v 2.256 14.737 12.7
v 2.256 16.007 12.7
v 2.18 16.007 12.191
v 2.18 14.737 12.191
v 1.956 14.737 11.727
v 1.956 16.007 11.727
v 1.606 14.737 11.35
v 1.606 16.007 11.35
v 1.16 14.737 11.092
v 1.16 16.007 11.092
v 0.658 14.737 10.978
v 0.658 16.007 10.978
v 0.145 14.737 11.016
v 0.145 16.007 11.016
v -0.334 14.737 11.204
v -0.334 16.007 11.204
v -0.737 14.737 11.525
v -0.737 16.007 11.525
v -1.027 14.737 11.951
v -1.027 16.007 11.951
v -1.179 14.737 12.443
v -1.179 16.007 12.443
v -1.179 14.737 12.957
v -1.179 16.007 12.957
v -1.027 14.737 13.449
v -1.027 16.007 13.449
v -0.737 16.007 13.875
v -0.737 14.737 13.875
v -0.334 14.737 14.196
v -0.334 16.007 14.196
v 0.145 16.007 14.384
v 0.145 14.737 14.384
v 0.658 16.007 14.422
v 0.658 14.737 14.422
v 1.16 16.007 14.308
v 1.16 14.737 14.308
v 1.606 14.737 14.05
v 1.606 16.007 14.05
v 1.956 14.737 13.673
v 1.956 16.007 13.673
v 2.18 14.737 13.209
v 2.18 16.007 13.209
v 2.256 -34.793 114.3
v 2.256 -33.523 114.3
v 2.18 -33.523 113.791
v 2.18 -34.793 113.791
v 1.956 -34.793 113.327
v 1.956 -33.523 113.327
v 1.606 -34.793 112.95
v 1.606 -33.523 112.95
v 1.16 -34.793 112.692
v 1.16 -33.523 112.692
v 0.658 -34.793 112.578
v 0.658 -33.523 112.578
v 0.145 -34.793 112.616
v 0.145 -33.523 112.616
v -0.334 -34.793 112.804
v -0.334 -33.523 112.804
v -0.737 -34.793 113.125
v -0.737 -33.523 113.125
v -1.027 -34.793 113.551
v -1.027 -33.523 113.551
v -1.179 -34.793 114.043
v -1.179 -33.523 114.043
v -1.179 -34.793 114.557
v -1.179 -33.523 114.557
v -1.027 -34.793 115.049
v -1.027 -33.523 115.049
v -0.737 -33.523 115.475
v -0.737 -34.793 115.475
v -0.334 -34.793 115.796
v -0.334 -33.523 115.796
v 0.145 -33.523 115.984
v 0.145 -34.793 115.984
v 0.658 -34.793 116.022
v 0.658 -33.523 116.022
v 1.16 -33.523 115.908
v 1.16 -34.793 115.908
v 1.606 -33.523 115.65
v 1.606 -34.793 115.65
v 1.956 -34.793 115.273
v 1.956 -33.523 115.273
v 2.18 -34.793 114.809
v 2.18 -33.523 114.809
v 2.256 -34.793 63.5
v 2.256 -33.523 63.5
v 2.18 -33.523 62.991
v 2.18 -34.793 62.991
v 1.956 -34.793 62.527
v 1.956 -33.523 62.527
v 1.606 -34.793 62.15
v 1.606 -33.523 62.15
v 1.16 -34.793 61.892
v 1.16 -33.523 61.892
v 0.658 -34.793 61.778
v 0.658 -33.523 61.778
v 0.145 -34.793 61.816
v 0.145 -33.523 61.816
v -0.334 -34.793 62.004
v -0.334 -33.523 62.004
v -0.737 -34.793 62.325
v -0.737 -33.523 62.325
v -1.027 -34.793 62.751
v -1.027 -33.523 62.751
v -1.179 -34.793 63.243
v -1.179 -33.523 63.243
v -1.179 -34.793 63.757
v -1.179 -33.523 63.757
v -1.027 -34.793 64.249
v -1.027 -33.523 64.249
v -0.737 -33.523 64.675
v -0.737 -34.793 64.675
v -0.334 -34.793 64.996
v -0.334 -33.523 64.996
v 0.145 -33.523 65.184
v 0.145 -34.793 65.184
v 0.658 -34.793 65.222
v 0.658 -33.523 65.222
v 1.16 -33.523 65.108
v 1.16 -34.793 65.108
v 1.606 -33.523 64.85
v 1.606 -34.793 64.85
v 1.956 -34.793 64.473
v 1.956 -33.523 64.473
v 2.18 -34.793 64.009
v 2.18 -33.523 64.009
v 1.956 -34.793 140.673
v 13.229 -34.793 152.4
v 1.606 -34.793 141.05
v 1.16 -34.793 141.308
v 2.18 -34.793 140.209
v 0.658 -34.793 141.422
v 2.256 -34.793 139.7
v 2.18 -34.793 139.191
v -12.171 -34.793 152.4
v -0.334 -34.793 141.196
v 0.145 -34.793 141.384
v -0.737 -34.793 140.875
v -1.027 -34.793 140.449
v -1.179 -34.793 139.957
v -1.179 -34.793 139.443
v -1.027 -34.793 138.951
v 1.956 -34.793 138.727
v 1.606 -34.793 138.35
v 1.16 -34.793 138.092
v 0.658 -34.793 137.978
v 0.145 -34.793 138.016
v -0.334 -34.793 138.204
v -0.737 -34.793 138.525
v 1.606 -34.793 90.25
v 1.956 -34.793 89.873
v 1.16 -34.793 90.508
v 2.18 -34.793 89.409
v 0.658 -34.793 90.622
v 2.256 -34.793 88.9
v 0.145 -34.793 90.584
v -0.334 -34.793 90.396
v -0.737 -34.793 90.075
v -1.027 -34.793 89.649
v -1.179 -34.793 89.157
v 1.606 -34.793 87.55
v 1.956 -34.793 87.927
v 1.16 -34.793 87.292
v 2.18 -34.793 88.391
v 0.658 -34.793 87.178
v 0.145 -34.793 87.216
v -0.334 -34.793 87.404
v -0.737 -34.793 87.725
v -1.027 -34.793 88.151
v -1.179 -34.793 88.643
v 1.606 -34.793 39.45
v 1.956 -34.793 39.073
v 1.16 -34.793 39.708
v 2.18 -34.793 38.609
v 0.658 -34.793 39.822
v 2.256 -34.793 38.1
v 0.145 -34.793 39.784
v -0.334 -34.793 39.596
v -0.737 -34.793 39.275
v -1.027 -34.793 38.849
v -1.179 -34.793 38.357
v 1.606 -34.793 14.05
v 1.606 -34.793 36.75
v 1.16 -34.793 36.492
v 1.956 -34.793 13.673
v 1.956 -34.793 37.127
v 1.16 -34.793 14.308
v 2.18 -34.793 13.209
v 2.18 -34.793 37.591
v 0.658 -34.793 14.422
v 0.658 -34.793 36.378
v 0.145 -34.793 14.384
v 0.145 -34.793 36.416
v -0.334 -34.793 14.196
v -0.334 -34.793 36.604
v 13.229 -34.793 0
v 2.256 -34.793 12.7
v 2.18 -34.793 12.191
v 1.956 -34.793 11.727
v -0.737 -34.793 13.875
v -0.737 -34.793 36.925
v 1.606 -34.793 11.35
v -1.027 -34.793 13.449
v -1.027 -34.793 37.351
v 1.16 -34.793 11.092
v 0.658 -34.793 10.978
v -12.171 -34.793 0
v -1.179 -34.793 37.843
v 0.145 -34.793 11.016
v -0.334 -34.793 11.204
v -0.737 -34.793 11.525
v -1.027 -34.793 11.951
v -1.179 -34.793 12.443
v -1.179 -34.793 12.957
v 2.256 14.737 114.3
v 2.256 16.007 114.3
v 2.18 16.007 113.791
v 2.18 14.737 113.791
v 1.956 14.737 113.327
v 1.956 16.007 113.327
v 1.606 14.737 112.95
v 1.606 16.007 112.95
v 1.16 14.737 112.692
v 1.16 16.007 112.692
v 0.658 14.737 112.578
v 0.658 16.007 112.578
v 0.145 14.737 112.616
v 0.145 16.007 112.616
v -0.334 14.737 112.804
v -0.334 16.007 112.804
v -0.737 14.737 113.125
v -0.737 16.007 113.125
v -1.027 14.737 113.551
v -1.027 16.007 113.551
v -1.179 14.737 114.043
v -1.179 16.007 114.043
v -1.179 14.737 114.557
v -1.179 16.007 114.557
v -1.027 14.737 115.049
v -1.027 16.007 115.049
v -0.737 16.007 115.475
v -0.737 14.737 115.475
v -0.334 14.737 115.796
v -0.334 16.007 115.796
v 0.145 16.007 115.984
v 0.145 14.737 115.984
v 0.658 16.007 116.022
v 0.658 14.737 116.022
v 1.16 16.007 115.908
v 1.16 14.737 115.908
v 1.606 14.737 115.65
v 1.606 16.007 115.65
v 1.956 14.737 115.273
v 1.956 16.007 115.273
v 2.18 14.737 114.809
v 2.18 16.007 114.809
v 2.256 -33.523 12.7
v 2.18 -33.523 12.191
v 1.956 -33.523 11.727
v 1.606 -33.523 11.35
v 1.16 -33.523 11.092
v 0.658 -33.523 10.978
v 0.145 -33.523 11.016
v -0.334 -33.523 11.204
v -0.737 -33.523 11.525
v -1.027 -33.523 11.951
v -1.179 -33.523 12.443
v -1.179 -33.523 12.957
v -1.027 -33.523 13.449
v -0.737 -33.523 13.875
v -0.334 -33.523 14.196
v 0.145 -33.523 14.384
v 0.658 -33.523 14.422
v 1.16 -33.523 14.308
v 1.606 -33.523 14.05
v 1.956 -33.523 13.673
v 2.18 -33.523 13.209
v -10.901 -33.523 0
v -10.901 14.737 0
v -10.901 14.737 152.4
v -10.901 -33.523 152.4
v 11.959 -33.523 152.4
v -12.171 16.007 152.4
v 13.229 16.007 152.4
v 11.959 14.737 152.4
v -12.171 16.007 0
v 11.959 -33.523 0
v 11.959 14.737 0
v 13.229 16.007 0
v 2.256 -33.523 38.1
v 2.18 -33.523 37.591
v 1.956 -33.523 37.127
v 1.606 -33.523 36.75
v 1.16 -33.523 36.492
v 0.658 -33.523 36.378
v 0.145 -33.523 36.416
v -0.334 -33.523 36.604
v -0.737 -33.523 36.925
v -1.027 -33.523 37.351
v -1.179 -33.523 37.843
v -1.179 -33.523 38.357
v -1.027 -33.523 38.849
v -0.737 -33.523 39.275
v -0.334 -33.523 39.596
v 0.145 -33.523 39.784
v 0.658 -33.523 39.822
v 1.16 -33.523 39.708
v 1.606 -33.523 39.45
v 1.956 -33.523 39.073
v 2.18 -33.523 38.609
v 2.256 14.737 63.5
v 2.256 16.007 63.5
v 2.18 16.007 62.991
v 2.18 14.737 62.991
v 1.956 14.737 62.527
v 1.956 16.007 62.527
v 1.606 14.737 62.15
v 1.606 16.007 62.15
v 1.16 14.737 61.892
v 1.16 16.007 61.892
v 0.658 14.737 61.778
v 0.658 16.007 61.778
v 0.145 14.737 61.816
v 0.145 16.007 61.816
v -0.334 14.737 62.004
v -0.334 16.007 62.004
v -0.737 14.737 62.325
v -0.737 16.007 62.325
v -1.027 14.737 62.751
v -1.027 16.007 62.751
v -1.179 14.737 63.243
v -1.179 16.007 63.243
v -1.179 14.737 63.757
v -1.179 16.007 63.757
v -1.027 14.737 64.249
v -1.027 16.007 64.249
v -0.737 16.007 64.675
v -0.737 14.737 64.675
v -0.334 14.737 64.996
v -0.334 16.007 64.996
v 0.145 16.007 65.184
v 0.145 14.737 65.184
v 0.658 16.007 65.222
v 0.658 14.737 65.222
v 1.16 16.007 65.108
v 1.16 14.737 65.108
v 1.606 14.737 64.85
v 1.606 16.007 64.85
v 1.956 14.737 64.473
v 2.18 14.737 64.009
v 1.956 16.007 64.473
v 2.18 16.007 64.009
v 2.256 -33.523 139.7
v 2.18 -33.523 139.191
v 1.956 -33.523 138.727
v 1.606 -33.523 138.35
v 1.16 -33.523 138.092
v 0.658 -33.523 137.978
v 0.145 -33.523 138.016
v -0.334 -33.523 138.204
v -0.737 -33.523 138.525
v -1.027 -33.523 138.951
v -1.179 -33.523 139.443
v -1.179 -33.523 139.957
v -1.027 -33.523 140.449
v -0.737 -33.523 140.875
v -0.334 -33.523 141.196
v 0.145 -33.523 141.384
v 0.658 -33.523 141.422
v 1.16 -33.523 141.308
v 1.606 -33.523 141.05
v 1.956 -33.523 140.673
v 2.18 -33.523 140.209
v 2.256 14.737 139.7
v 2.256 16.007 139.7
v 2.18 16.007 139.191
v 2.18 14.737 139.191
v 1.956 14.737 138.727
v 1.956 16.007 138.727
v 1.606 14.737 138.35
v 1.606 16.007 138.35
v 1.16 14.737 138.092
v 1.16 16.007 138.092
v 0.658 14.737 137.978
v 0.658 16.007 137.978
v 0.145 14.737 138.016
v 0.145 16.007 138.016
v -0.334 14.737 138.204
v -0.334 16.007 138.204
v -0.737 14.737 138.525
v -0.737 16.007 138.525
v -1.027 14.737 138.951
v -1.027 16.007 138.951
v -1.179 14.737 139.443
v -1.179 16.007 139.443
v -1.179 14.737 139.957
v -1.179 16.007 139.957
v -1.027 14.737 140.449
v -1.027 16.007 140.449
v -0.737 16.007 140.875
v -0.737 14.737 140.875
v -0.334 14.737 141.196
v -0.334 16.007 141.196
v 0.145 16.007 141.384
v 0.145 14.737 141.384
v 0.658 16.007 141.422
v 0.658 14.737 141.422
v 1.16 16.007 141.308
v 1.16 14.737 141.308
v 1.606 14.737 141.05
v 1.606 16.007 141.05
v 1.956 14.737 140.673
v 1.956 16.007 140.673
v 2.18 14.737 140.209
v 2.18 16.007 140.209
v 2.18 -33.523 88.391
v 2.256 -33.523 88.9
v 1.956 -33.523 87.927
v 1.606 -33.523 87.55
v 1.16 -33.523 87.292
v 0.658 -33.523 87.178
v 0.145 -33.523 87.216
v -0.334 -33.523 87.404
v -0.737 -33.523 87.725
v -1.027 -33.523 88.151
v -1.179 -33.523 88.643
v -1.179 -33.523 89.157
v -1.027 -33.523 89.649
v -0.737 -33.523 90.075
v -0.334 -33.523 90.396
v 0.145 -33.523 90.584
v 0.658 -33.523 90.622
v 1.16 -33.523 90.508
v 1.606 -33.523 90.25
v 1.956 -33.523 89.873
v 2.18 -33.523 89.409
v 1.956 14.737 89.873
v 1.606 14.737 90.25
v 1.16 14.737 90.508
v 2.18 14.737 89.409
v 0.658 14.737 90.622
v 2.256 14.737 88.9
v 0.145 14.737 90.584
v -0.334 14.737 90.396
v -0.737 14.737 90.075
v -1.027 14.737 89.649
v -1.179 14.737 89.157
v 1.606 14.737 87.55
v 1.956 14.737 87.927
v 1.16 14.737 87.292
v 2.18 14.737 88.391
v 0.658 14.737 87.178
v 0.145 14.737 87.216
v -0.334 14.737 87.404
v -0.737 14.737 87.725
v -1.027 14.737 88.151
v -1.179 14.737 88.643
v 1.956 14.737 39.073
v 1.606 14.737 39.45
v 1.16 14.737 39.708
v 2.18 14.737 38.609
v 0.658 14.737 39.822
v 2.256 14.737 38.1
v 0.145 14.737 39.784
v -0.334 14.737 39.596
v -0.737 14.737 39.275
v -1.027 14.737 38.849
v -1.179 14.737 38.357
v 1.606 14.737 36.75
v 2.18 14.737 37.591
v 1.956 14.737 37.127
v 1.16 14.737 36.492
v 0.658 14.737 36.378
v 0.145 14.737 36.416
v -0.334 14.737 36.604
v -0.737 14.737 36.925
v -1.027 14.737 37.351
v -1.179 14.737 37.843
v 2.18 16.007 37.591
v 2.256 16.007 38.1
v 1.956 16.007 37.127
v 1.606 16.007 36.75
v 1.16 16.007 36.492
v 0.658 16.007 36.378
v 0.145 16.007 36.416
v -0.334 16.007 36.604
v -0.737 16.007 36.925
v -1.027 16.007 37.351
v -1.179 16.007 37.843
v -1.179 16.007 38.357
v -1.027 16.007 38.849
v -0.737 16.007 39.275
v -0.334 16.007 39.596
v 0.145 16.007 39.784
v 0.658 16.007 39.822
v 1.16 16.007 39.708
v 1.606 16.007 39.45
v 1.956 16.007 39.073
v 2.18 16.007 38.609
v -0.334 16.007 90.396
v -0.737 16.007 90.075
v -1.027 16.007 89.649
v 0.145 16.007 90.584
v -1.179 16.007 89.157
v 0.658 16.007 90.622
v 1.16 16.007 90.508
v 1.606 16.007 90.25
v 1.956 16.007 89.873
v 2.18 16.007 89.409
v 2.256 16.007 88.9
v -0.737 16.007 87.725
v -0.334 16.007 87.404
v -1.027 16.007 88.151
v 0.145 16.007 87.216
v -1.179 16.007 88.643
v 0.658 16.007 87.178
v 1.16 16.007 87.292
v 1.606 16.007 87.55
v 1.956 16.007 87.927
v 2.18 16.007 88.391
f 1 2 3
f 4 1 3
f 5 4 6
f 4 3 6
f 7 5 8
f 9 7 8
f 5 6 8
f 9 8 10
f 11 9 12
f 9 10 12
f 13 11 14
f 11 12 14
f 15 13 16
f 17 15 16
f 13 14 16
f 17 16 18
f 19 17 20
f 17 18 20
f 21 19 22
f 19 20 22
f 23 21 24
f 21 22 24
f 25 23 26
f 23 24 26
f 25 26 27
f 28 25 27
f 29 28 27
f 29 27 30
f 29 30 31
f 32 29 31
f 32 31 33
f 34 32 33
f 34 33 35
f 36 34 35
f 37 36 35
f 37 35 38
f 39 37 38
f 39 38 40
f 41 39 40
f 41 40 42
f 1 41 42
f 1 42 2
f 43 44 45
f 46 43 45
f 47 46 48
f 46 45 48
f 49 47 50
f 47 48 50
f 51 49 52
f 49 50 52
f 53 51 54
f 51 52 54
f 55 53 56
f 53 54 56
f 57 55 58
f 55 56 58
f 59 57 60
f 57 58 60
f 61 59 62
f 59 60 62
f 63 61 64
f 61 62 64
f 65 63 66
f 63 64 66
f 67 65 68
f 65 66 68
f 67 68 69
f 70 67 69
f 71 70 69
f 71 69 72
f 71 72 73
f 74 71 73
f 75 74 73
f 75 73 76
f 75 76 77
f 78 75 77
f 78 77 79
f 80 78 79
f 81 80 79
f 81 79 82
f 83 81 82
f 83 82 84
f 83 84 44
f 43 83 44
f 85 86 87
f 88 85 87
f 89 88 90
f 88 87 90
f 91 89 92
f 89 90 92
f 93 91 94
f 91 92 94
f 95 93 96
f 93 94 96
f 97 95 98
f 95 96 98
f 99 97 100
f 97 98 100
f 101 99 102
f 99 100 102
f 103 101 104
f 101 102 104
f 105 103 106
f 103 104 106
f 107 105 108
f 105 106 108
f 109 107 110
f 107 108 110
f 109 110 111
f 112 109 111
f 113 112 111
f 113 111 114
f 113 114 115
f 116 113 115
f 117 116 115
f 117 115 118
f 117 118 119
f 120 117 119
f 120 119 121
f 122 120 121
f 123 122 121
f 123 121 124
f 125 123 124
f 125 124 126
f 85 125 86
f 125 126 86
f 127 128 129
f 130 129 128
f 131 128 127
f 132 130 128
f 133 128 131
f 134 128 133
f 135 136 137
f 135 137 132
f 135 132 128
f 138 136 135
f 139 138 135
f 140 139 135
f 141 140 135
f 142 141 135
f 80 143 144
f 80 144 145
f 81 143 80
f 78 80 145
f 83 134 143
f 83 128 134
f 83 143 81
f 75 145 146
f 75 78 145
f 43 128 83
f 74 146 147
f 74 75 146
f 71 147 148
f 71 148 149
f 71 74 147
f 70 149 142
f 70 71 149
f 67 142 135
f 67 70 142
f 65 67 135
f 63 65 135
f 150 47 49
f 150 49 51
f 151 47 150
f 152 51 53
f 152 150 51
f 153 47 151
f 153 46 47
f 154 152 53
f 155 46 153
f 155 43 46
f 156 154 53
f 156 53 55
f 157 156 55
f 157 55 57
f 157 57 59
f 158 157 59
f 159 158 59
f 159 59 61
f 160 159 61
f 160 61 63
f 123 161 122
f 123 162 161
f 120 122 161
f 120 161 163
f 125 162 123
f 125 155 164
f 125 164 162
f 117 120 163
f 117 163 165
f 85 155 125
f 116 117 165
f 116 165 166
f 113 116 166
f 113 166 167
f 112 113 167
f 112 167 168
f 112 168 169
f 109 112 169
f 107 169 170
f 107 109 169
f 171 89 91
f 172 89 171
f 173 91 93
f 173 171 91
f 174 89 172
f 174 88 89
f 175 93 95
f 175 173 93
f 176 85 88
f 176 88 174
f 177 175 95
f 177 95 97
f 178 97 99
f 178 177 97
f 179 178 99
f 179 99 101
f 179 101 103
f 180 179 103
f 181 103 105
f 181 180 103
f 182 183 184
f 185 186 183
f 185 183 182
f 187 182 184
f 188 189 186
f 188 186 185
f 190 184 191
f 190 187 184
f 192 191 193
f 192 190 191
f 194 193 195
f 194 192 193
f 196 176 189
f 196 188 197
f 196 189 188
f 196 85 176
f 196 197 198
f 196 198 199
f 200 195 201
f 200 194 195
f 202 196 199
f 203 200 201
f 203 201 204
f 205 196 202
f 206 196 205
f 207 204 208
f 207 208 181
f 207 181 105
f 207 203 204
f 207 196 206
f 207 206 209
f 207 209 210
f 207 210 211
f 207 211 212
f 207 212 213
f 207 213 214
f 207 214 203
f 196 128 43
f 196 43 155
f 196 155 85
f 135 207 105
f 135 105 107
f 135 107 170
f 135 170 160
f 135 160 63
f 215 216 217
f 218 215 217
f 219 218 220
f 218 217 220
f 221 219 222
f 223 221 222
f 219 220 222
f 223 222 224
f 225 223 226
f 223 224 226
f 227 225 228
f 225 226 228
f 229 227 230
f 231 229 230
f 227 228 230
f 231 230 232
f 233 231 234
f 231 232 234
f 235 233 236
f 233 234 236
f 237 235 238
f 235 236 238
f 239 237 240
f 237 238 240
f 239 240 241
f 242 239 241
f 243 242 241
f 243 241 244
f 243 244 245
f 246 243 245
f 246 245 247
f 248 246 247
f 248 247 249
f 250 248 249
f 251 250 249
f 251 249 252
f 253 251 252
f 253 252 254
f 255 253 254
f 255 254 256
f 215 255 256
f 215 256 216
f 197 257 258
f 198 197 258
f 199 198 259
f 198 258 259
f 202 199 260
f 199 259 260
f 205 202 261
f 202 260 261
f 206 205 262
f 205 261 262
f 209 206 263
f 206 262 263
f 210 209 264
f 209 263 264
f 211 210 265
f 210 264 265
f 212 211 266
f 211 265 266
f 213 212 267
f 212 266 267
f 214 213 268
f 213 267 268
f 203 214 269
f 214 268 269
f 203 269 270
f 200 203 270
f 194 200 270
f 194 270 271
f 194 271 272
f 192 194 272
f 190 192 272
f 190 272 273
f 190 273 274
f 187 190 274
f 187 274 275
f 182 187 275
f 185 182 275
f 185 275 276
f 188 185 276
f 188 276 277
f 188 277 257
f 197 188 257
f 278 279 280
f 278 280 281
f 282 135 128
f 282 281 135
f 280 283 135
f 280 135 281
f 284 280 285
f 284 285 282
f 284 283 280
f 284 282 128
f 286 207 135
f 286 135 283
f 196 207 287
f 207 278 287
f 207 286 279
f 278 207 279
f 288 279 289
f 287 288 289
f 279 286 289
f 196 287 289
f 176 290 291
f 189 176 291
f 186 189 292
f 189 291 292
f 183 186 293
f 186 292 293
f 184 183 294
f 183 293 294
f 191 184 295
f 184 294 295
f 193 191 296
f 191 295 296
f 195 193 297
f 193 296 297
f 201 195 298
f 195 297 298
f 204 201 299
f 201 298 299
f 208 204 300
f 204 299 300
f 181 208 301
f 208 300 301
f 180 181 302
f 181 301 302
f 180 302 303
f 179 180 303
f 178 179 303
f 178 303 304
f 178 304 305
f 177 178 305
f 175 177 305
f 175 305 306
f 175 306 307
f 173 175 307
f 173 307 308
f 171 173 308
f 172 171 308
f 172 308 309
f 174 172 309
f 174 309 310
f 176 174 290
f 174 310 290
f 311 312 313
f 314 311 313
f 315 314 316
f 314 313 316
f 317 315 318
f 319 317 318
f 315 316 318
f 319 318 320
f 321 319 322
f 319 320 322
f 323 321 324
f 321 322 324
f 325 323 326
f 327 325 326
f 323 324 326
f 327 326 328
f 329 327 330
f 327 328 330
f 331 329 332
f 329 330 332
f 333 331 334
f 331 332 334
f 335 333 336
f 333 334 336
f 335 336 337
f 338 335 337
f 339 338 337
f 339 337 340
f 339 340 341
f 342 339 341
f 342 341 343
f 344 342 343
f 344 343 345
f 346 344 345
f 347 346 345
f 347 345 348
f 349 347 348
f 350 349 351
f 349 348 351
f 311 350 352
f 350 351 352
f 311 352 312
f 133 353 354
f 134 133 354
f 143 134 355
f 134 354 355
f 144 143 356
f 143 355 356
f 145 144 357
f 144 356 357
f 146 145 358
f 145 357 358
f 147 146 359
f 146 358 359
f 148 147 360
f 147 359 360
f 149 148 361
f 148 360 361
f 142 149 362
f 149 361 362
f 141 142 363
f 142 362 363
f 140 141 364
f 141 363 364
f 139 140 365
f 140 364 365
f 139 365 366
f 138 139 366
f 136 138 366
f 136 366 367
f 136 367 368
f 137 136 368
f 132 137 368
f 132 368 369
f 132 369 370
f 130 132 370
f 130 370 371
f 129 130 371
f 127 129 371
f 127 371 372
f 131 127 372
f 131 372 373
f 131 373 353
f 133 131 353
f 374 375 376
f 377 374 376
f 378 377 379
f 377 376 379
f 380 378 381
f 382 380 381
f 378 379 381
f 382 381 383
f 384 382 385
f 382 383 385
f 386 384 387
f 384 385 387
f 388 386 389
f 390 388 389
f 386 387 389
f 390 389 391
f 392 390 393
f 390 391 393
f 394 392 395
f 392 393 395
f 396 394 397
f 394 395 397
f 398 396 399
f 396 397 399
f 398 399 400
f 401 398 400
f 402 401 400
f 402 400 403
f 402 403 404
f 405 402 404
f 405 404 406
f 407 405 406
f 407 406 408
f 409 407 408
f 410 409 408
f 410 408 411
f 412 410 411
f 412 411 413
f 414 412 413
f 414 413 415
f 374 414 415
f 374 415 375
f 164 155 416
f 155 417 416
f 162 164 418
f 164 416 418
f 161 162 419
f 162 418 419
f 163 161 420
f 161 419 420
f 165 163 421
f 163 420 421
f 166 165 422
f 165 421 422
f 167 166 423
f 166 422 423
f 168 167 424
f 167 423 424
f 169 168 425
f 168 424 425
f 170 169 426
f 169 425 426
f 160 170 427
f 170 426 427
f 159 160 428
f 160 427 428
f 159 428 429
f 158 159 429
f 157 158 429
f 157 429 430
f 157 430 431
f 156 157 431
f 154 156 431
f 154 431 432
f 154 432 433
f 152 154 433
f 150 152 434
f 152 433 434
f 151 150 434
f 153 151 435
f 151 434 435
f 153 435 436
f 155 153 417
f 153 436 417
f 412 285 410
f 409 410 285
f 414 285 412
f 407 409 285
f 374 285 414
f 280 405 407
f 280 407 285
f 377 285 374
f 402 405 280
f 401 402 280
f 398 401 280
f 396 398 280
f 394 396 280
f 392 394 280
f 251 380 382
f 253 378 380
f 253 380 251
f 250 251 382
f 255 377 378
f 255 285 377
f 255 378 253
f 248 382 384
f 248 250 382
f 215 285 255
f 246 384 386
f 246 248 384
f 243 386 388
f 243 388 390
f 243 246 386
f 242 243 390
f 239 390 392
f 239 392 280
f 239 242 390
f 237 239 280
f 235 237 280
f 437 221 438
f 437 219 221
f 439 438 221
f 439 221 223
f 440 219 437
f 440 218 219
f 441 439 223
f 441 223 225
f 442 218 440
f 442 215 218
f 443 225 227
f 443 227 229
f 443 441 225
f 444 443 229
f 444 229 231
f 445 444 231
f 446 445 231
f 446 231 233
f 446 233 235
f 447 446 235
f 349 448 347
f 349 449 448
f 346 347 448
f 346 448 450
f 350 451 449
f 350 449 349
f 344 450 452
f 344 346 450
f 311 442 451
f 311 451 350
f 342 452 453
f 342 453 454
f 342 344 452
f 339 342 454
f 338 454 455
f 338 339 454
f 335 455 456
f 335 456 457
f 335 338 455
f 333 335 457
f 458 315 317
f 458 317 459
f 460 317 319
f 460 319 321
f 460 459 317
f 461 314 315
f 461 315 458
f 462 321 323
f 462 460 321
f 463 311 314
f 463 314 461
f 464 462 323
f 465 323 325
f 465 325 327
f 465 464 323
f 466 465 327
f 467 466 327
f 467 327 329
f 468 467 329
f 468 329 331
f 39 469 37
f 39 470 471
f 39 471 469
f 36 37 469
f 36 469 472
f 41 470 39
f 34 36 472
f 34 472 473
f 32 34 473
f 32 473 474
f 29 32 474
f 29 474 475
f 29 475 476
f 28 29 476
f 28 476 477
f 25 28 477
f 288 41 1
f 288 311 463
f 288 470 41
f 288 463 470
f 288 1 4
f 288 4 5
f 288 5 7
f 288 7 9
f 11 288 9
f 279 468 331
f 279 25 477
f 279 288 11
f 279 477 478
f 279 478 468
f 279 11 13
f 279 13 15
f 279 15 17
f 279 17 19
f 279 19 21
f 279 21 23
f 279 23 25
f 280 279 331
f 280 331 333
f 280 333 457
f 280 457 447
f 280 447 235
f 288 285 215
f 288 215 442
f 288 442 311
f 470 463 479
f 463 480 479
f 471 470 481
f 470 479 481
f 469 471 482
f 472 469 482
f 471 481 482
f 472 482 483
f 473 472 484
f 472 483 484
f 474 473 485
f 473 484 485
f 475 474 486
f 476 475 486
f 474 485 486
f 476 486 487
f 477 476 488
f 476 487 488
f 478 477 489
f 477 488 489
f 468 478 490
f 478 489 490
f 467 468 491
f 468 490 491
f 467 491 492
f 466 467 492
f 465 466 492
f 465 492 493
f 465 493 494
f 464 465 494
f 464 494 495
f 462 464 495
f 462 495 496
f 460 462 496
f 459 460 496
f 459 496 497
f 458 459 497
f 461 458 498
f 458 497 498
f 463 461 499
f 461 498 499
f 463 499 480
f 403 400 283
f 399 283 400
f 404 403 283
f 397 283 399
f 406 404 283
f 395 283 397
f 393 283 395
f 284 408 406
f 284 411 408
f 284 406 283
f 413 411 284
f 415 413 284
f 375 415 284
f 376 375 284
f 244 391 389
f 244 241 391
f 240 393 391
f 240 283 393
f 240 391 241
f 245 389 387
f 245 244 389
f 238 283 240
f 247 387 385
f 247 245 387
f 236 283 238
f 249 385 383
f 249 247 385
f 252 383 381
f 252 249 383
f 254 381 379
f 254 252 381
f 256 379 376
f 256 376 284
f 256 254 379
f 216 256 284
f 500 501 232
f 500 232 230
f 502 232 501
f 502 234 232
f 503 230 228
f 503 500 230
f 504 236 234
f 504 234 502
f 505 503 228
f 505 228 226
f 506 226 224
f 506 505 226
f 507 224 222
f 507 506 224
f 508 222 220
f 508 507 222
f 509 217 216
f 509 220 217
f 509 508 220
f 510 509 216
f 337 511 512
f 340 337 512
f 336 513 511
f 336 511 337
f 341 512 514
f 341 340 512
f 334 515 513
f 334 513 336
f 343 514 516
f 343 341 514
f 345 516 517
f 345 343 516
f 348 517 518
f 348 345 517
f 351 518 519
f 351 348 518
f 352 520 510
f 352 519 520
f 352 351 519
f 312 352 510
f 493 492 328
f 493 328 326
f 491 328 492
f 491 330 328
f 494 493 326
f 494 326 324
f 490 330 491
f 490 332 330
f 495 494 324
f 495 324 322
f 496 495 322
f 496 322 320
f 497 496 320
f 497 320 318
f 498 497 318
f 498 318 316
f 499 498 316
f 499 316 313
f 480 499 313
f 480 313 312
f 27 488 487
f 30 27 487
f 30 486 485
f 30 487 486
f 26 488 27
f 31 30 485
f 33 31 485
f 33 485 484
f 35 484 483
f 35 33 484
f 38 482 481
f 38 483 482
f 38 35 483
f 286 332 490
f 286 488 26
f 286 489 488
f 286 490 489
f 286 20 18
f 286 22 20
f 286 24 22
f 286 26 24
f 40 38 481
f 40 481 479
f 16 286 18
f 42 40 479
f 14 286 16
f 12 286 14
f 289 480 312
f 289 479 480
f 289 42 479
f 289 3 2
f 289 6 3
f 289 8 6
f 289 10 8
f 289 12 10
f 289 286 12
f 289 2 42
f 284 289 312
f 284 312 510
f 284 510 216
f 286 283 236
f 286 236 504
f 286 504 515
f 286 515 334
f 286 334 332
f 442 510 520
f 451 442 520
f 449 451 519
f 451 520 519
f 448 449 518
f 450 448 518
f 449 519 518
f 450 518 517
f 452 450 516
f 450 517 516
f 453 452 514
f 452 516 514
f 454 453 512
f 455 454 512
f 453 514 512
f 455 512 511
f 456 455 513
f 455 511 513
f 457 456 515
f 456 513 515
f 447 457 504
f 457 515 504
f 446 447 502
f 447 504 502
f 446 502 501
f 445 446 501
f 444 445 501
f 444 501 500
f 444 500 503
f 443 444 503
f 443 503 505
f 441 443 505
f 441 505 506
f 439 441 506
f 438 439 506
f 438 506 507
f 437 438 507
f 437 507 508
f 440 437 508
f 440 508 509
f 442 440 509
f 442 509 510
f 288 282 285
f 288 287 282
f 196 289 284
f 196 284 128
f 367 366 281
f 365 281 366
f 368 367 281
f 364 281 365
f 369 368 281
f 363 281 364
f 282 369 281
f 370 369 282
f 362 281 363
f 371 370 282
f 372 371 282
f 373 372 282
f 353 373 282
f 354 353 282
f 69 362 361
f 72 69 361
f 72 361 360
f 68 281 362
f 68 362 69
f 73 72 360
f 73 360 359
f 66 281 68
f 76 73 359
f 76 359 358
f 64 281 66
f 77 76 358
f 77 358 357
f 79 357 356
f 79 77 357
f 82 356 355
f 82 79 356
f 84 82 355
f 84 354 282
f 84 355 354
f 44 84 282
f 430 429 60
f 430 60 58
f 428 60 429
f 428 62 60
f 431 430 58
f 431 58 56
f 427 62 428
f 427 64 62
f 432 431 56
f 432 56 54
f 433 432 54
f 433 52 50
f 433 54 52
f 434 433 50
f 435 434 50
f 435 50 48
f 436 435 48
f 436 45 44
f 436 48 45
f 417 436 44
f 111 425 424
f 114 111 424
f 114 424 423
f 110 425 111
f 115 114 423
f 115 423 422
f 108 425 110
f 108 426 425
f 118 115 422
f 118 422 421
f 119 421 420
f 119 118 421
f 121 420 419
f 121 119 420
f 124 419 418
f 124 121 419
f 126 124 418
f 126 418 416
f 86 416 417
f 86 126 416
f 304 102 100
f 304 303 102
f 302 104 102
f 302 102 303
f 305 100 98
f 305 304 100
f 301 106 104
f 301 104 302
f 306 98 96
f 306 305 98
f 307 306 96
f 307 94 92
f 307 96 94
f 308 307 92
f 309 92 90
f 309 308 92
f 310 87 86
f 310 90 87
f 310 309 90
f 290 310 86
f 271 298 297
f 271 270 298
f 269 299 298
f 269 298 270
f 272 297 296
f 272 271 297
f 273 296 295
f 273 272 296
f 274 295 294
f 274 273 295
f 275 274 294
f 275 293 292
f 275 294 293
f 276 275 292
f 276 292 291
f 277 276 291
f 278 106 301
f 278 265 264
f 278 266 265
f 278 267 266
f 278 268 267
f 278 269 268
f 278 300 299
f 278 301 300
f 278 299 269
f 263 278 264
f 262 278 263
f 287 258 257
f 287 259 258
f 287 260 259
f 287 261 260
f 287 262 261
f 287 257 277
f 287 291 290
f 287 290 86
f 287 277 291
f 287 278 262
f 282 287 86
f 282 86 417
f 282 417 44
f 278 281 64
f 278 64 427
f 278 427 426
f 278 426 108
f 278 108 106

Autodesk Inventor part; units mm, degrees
ref_plane "YZ Plane" through (0, 0, 0) normal (1, 0, 0) x (0, 1, 0)
ref_plane "XZ Plane" through (0, 0, 0) normal (0, 1, 0) x (-1, 0, 0)
ref_plane "XY Plane" through (0, 0, 0) normal (0, 0, 1) x (1, 0, 0)
sketch "Sketch1" plane through (0, 0, 0) normal (0, 0, 1) x (1, 0, 0)
  line L0 (-12.1708, 16.0073) -> (13.2292, 16.0073)
  line L1 (13.2292, 16.0073) -> (13.2292, -34.7927)
  line L2 (13.2292, -34.7927) -> (-12.1708, -34.7927)
  line L3 (-12.1708, -34.7927) -> (-12.1708, 16.0073)
  line L4 (11.9592, 14.7373) -> (-10.9008, 14.7373)
  line L5 (-10.9008, 14.7373) -> (-10.9008, -33.5227)
  line L6 (-10.9008, -33.5227) -> (11.9592, -33.5227)
  line L7 (11.9592, -33.5227) -> (11.9592, 14.7373)
  point P0 (0, 0)
  dimension "d0" = 25.4
  dimension "d1" = 50.8
  dimension "d2" = 1.27
extrude "Extrusion1" add sketch "Sketch1" along normal blind 152.4
sketch "Sketch2" plane through (-12.1708, 16.0073, 0) normal (0, 1, 0) x (1, 0, 0)
  circle A0 centre (12.7, -12.7) radius 1.7272
  line L0 (25.4, 0) -> (0, 0) projected
  line L1 (0, 0) -> (0, -152.4) projected
  point P0 (12.1708, 0)
  dimension "d5" = 3.4544
  dimension "d6" = 12.7
  dimension "d7" = 12.7
extrude "Extrusion2" cut sketch "Sketch2" against normal through all
pattern_linear "Rectangular Pattern1" count 6 spacing 25.4 along (0, 0, 1) of "Extrusion2"
equation "\"d3\" = d13"
equation "\"d13\" = 152.4"
properties part number "VerseFrame 6in"
